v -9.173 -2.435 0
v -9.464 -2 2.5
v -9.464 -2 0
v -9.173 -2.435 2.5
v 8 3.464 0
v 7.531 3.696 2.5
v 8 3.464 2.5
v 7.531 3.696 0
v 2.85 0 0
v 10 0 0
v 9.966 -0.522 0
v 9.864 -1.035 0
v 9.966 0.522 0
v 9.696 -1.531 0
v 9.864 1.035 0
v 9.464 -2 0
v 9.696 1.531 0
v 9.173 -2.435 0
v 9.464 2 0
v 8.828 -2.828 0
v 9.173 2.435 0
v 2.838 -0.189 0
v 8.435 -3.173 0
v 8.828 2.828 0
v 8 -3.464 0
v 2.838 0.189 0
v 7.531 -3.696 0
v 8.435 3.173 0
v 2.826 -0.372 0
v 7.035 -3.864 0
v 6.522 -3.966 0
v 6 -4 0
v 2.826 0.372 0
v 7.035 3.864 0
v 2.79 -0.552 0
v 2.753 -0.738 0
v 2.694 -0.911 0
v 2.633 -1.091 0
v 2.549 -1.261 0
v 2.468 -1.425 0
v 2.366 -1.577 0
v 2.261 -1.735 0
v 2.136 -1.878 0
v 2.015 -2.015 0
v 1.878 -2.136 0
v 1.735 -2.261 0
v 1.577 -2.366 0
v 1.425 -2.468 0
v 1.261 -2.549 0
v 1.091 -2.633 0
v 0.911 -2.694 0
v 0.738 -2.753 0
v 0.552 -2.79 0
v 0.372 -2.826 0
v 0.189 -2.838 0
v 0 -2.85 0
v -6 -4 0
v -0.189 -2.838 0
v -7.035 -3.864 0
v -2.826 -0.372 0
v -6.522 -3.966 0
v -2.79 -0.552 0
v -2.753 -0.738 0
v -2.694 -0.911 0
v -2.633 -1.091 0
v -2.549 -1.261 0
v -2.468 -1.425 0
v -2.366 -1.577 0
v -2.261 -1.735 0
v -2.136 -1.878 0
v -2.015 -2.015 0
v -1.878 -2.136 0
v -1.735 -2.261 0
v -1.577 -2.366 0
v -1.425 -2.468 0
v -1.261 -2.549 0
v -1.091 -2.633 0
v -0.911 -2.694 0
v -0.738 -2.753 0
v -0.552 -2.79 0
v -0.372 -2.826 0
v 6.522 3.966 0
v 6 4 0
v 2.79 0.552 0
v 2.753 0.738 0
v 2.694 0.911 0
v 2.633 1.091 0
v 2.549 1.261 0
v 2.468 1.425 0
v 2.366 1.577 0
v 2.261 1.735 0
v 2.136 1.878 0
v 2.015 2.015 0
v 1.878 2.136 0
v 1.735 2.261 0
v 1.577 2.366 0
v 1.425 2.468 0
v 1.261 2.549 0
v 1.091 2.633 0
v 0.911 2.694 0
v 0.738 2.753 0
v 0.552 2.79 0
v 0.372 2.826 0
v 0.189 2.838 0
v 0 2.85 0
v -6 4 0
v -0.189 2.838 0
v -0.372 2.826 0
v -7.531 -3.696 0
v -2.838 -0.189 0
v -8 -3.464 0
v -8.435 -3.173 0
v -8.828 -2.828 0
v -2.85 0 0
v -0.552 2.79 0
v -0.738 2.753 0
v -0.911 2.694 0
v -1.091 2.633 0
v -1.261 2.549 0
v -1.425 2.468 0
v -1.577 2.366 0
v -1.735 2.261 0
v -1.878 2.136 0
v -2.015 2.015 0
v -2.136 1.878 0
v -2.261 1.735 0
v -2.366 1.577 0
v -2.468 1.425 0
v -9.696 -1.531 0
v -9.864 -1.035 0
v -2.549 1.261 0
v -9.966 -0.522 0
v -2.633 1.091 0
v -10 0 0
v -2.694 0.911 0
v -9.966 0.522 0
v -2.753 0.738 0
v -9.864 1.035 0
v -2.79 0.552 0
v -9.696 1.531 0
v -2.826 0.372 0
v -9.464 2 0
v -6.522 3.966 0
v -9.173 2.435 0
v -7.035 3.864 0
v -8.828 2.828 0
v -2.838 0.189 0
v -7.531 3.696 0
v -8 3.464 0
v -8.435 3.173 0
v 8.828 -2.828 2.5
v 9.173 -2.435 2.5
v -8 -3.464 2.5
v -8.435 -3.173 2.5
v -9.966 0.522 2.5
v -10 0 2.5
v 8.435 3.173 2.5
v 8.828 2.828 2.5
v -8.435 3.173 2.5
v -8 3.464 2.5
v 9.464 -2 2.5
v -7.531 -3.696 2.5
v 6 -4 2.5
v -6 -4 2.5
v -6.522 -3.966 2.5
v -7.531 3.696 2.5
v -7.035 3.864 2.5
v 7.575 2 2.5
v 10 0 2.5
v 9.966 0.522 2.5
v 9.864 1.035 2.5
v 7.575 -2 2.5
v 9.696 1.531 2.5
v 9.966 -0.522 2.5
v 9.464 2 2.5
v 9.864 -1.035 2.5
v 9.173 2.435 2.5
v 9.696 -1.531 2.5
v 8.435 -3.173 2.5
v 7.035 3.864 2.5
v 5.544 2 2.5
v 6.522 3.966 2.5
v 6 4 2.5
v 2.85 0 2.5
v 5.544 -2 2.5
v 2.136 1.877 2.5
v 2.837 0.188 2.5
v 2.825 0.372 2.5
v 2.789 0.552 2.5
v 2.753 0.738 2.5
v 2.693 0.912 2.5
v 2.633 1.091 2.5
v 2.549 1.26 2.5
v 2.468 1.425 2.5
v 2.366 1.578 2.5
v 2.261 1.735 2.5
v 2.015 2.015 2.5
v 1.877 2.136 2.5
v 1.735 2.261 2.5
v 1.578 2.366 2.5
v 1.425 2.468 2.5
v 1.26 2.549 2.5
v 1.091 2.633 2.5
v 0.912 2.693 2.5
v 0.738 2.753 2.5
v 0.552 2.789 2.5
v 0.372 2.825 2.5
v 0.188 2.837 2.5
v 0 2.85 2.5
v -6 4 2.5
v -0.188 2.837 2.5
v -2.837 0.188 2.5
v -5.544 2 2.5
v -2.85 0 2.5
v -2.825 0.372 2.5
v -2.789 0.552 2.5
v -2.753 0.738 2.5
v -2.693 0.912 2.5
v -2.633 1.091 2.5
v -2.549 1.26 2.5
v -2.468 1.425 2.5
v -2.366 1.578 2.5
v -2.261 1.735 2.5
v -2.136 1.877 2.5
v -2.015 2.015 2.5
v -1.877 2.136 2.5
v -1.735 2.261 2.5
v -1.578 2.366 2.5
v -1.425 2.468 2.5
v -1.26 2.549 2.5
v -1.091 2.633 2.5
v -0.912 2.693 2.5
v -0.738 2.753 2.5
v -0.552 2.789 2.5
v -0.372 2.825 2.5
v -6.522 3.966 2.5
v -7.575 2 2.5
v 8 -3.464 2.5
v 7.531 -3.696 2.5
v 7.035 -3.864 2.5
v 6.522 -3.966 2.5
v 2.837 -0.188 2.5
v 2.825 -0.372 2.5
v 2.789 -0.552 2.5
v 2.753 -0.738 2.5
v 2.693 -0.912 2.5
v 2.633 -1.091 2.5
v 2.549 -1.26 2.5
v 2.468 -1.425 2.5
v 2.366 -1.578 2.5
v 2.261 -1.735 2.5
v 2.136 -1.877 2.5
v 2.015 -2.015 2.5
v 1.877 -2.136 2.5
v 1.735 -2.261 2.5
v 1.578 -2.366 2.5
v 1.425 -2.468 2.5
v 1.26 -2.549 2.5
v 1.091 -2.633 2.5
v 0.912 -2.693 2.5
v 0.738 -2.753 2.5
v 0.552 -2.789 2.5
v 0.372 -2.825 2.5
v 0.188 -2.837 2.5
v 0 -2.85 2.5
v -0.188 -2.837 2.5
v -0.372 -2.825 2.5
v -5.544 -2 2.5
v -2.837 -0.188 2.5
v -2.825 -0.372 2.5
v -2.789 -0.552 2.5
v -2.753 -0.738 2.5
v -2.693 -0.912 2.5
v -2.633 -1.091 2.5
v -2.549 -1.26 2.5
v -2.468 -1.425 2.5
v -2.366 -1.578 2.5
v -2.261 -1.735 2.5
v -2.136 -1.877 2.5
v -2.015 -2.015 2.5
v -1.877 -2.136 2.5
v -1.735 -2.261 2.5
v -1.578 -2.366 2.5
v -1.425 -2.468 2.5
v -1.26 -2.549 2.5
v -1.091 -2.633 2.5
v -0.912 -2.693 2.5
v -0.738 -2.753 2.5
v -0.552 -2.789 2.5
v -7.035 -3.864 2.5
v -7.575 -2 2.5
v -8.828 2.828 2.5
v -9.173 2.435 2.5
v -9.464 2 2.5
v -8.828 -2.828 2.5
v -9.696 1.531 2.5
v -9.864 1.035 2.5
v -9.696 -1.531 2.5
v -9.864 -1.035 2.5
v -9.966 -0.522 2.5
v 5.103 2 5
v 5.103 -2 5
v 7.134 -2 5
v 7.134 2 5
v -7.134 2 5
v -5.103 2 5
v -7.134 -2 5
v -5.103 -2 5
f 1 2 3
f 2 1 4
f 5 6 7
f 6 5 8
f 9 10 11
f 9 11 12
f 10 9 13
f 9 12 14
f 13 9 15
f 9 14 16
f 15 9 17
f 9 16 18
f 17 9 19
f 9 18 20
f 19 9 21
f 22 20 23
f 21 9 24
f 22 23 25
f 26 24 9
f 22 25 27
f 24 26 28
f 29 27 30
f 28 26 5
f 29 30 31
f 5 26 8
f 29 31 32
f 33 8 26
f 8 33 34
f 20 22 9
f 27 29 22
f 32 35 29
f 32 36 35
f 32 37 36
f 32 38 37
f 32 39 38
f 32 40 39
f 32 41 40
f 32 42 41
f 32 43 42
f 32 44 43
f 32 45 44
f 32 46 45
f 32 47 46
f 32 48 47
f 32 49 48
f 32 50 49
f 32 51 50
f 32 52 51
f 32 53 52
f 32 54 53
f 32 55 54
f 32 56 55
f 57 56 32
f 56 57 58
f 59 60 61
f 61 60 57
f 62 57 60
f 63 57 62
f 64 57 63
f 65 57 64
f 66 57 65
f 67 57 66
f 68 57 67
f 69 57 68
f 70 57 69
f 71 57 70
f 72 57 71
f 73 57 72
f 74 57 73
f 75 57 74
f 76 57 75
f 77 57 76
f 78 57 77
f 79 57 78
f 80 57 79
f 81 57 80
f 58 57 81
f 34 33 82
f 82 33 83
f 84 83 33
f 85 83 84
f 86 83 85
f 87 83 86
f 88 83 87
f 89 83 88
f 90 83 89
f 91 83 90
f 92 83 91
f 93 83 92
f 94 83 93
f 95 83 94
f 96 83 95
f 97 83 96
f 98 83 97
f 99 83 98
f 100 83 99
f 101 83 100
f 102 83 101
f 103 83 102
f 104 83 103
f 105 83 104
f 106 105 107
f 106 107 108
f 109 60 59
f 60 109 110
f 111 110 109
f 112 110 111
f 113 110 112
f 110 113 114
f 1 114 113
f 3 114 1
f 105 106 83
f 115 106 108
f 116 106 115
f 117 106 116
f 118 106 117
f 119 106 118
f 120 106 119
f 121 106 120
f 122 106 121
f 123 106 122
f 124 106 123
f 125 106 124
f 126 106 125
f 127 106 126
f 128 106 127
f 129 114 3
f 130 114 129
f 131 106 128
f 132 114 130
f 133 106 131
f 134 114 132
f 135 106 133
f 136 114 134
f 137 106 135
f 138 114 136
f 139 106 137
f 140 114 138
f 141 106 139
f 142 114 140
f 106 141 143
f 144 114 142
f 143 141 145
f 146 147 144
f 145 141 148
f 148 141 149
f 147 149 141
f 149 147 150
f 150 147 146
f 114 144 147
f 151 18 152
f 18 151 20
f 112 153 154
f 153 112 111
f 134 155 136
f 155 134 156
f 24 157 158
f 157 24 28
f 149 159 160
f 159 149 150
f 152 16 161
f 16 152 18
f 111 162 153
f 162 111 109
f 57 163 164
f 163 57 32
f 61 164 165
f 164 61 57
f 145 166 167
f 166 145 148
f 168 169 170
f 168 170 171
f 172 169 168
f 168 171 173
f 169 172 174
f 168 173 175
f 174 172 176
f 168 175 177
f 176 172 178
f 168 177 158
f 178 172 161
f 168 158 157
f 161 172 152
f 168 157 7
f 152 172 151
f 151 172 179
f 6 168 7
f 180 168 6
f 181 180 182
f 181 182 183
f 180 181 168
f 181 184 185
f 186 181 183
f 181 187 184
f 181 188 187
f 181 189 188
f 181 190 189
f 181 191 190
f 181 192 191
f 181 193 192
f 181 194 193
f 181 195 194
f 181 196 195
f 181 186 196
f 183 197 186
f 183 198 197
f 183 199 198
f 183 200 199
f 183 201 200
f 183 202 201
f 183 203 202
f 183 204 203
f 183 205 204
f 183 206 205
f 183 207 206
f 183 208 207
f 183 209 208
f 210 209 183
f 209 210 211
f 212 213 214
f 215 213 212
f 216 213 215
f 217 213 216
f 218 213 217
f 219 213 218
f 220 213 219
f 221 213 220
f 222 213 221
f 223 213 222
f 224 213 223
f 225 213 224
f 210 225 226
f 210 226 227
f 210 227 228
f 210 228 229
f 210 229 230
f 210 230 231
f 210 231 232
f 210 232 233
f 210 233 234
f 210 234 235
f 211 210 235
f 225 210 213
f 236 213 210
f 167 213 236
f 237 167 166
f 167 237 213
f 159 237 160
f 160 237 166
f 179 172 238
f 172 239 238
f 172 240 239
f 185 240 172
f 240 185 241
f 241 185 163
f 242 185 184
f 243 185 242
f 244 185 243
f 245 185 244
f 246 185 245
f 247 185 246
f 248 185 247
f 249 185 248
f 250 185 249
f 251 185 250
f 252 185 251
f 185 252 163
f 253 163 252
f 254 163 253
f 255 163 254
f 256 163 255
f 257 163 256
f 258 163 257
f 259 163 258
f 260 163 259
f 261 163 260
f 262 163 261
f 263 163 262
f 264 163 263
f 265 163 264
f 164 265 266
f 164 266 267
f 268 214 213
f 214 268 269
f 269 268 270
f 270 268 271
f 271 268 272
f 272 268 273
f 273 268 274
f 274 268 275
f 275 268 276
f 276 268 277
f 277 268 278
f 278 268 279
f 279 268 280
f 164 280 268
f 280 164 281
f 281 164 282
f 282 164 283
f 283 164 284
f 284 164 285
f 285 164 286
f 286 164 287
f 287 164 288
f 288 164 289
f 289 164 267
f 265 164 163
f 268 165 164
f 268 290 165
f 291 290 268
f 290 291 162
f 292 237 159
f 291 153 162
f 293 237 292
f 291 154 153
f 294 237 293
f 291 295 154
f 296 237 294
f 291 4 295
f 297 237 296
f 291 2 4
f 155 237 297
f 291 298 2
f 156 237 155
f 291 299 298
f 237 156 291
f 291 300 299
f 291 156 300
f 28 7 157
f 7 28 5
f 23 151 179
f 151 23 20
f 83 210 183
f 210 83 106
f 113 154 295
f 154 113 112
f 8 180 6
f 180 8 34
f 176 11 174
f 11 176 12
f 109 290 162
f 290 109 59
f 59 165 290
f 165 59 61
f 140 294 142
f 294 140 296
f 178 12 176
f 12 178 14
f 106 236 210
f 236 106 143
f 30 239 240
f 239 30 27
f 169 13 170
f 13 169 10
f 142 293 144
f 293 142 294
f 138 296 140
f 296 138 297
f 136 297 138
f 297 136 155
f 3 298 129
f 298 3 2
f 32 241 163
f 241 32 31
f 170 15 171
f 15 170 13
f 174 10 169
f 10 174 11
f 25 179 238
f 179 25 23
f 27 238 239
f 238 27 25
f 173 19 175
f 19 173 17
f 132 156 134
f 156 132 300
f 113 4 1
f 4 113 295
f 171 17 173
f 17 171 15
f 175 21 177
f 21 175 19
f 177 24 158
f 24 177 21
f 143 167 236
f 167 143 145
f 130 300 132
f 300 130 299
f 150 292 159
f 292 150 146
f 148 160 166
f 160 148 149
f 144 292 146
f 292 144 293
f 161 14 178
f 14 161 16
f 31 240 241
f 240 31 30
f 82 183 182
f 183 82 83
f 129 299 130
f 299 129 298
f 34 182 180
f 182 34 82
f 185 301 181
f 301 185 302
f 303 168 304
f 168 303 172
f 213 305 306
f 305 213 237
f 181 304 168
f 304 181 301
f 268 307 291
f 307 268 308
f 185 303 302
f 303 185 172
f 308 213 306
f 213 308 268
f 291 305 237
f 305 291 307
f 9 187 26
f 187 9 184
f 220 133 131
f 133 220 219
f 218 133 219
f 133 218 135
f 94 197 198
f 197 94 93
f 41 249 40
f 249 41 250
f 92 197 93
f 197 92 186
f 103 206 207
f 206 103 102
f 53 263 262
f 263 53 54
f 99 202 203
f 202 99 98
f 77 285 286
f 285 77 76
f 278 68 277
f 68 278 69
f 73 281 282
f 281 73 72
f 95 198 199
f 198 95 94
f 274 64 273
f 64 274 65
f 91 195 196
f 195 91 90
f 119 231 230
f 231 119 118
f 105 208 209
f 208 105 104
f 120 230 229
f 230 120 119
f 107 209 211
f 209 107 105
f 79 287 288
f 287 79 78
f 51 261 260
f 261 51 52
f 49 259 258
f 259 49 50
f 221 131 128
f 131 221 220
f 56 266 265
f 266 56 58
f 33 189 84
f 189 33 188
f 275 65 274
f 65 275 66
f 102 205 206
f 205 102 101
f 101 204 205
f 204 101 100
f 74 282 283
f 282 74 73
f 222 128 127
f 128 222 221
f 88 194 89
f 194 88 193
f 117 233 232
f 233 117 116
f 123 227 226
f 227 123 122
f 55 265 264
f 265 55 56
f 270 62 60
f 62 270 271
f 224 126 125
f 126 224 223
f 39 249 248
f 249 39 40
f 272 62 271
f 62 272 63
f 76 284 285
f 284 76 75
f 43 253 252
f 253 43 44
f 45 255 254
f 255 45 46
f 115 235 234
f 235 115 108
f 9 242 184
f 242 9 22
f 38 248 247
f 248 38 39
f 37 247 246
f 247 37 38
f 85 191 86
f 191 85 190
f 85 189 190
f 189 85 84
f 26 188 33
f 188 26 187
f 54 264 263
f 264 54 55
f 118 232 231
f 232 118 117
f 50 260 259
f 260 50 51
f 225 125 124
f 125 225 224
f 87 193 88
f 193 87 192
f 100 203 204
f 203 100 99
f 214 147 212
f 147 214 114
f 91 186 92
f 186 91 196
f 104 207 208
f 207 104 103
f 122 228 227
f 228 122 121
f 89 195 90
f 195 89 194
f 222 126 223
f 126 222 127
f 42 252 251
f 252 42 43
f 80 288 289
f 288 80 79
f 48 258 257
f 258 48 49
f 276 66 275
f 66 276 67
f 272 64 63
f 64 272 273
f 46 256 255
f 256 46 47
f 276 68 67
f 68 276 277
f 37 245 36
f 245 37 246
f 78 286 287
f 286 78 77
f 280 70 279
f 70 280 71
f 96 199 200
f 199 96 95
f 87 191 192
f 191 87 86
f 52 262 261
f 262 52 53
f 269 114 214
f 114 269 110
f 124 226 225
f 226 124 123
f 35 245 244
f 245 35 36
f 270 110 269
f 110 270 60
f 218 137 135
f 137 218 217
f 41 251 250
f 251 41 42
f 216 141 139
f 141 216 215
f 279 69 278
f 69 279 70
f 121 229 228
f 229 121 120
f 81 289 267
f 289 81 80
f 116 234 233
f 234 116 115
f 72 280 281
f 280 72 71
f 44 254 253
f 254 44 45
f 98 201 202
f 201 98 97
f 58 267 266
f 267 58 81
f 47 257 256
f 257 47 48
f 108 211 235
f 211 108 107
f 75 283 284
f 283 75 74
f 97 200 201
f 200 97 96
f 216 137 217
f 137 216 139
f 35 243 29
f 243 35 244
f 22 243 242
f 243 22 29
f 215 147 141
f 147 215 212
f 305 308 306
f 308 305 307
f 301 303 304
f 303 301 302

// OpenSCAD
// unendlich
unendlich = 1000;

// Grundplatte
gp_d1 = 20; // laenge
gp_d2 = 8;  // breite
gp_d3 = 2.5;  // hoehe

// Finger
f_a = 10; // winkel
f_d1 = 2; // dicke
f_d2 = 4; // breite
f_d3 = 7; // abstand
f_d4 = 5; // hoehe

// Loch
l_r1 = 2.9; // radius 1
l_r2 = 2.8; // radius 2

intersection() {
    difference () {
        union() {
            hull () {
                translate([(gp_d1-gp_d2)/2, 0, 0]) 
                    cylinder(h = gp_d3, r1 = gp_d2/2, r2 = gp_d2/2, $fn=48);
                translate([-(gp_d1-gp_d2)/2, 0, 0]) 
                    cylinder(h = gp_d3, r1 = gp_d2/2, r2 = gp_d2/2, $fn=48);
            }
            translate([f_d3, 0, 0]) 
                rotate([0, -f_a, 0]) 
                    cube([f_d1, f_d2, unendlich], true);
            translate([-f_d3, 0, 0]) 
                rotate([0, f_a, 0]) 
                    cube([f_d1, f_d2, unendlich], true);
        }
        translate([0,0,-unendlich/2]) 
            cylinder(h=unendlich, r1=l_r1, r2=l_r2, $fn=48);
    }
    translate([0,0,f_d4/2]) 
        cube([unendlich, unendlich, f_d4],true);
}
